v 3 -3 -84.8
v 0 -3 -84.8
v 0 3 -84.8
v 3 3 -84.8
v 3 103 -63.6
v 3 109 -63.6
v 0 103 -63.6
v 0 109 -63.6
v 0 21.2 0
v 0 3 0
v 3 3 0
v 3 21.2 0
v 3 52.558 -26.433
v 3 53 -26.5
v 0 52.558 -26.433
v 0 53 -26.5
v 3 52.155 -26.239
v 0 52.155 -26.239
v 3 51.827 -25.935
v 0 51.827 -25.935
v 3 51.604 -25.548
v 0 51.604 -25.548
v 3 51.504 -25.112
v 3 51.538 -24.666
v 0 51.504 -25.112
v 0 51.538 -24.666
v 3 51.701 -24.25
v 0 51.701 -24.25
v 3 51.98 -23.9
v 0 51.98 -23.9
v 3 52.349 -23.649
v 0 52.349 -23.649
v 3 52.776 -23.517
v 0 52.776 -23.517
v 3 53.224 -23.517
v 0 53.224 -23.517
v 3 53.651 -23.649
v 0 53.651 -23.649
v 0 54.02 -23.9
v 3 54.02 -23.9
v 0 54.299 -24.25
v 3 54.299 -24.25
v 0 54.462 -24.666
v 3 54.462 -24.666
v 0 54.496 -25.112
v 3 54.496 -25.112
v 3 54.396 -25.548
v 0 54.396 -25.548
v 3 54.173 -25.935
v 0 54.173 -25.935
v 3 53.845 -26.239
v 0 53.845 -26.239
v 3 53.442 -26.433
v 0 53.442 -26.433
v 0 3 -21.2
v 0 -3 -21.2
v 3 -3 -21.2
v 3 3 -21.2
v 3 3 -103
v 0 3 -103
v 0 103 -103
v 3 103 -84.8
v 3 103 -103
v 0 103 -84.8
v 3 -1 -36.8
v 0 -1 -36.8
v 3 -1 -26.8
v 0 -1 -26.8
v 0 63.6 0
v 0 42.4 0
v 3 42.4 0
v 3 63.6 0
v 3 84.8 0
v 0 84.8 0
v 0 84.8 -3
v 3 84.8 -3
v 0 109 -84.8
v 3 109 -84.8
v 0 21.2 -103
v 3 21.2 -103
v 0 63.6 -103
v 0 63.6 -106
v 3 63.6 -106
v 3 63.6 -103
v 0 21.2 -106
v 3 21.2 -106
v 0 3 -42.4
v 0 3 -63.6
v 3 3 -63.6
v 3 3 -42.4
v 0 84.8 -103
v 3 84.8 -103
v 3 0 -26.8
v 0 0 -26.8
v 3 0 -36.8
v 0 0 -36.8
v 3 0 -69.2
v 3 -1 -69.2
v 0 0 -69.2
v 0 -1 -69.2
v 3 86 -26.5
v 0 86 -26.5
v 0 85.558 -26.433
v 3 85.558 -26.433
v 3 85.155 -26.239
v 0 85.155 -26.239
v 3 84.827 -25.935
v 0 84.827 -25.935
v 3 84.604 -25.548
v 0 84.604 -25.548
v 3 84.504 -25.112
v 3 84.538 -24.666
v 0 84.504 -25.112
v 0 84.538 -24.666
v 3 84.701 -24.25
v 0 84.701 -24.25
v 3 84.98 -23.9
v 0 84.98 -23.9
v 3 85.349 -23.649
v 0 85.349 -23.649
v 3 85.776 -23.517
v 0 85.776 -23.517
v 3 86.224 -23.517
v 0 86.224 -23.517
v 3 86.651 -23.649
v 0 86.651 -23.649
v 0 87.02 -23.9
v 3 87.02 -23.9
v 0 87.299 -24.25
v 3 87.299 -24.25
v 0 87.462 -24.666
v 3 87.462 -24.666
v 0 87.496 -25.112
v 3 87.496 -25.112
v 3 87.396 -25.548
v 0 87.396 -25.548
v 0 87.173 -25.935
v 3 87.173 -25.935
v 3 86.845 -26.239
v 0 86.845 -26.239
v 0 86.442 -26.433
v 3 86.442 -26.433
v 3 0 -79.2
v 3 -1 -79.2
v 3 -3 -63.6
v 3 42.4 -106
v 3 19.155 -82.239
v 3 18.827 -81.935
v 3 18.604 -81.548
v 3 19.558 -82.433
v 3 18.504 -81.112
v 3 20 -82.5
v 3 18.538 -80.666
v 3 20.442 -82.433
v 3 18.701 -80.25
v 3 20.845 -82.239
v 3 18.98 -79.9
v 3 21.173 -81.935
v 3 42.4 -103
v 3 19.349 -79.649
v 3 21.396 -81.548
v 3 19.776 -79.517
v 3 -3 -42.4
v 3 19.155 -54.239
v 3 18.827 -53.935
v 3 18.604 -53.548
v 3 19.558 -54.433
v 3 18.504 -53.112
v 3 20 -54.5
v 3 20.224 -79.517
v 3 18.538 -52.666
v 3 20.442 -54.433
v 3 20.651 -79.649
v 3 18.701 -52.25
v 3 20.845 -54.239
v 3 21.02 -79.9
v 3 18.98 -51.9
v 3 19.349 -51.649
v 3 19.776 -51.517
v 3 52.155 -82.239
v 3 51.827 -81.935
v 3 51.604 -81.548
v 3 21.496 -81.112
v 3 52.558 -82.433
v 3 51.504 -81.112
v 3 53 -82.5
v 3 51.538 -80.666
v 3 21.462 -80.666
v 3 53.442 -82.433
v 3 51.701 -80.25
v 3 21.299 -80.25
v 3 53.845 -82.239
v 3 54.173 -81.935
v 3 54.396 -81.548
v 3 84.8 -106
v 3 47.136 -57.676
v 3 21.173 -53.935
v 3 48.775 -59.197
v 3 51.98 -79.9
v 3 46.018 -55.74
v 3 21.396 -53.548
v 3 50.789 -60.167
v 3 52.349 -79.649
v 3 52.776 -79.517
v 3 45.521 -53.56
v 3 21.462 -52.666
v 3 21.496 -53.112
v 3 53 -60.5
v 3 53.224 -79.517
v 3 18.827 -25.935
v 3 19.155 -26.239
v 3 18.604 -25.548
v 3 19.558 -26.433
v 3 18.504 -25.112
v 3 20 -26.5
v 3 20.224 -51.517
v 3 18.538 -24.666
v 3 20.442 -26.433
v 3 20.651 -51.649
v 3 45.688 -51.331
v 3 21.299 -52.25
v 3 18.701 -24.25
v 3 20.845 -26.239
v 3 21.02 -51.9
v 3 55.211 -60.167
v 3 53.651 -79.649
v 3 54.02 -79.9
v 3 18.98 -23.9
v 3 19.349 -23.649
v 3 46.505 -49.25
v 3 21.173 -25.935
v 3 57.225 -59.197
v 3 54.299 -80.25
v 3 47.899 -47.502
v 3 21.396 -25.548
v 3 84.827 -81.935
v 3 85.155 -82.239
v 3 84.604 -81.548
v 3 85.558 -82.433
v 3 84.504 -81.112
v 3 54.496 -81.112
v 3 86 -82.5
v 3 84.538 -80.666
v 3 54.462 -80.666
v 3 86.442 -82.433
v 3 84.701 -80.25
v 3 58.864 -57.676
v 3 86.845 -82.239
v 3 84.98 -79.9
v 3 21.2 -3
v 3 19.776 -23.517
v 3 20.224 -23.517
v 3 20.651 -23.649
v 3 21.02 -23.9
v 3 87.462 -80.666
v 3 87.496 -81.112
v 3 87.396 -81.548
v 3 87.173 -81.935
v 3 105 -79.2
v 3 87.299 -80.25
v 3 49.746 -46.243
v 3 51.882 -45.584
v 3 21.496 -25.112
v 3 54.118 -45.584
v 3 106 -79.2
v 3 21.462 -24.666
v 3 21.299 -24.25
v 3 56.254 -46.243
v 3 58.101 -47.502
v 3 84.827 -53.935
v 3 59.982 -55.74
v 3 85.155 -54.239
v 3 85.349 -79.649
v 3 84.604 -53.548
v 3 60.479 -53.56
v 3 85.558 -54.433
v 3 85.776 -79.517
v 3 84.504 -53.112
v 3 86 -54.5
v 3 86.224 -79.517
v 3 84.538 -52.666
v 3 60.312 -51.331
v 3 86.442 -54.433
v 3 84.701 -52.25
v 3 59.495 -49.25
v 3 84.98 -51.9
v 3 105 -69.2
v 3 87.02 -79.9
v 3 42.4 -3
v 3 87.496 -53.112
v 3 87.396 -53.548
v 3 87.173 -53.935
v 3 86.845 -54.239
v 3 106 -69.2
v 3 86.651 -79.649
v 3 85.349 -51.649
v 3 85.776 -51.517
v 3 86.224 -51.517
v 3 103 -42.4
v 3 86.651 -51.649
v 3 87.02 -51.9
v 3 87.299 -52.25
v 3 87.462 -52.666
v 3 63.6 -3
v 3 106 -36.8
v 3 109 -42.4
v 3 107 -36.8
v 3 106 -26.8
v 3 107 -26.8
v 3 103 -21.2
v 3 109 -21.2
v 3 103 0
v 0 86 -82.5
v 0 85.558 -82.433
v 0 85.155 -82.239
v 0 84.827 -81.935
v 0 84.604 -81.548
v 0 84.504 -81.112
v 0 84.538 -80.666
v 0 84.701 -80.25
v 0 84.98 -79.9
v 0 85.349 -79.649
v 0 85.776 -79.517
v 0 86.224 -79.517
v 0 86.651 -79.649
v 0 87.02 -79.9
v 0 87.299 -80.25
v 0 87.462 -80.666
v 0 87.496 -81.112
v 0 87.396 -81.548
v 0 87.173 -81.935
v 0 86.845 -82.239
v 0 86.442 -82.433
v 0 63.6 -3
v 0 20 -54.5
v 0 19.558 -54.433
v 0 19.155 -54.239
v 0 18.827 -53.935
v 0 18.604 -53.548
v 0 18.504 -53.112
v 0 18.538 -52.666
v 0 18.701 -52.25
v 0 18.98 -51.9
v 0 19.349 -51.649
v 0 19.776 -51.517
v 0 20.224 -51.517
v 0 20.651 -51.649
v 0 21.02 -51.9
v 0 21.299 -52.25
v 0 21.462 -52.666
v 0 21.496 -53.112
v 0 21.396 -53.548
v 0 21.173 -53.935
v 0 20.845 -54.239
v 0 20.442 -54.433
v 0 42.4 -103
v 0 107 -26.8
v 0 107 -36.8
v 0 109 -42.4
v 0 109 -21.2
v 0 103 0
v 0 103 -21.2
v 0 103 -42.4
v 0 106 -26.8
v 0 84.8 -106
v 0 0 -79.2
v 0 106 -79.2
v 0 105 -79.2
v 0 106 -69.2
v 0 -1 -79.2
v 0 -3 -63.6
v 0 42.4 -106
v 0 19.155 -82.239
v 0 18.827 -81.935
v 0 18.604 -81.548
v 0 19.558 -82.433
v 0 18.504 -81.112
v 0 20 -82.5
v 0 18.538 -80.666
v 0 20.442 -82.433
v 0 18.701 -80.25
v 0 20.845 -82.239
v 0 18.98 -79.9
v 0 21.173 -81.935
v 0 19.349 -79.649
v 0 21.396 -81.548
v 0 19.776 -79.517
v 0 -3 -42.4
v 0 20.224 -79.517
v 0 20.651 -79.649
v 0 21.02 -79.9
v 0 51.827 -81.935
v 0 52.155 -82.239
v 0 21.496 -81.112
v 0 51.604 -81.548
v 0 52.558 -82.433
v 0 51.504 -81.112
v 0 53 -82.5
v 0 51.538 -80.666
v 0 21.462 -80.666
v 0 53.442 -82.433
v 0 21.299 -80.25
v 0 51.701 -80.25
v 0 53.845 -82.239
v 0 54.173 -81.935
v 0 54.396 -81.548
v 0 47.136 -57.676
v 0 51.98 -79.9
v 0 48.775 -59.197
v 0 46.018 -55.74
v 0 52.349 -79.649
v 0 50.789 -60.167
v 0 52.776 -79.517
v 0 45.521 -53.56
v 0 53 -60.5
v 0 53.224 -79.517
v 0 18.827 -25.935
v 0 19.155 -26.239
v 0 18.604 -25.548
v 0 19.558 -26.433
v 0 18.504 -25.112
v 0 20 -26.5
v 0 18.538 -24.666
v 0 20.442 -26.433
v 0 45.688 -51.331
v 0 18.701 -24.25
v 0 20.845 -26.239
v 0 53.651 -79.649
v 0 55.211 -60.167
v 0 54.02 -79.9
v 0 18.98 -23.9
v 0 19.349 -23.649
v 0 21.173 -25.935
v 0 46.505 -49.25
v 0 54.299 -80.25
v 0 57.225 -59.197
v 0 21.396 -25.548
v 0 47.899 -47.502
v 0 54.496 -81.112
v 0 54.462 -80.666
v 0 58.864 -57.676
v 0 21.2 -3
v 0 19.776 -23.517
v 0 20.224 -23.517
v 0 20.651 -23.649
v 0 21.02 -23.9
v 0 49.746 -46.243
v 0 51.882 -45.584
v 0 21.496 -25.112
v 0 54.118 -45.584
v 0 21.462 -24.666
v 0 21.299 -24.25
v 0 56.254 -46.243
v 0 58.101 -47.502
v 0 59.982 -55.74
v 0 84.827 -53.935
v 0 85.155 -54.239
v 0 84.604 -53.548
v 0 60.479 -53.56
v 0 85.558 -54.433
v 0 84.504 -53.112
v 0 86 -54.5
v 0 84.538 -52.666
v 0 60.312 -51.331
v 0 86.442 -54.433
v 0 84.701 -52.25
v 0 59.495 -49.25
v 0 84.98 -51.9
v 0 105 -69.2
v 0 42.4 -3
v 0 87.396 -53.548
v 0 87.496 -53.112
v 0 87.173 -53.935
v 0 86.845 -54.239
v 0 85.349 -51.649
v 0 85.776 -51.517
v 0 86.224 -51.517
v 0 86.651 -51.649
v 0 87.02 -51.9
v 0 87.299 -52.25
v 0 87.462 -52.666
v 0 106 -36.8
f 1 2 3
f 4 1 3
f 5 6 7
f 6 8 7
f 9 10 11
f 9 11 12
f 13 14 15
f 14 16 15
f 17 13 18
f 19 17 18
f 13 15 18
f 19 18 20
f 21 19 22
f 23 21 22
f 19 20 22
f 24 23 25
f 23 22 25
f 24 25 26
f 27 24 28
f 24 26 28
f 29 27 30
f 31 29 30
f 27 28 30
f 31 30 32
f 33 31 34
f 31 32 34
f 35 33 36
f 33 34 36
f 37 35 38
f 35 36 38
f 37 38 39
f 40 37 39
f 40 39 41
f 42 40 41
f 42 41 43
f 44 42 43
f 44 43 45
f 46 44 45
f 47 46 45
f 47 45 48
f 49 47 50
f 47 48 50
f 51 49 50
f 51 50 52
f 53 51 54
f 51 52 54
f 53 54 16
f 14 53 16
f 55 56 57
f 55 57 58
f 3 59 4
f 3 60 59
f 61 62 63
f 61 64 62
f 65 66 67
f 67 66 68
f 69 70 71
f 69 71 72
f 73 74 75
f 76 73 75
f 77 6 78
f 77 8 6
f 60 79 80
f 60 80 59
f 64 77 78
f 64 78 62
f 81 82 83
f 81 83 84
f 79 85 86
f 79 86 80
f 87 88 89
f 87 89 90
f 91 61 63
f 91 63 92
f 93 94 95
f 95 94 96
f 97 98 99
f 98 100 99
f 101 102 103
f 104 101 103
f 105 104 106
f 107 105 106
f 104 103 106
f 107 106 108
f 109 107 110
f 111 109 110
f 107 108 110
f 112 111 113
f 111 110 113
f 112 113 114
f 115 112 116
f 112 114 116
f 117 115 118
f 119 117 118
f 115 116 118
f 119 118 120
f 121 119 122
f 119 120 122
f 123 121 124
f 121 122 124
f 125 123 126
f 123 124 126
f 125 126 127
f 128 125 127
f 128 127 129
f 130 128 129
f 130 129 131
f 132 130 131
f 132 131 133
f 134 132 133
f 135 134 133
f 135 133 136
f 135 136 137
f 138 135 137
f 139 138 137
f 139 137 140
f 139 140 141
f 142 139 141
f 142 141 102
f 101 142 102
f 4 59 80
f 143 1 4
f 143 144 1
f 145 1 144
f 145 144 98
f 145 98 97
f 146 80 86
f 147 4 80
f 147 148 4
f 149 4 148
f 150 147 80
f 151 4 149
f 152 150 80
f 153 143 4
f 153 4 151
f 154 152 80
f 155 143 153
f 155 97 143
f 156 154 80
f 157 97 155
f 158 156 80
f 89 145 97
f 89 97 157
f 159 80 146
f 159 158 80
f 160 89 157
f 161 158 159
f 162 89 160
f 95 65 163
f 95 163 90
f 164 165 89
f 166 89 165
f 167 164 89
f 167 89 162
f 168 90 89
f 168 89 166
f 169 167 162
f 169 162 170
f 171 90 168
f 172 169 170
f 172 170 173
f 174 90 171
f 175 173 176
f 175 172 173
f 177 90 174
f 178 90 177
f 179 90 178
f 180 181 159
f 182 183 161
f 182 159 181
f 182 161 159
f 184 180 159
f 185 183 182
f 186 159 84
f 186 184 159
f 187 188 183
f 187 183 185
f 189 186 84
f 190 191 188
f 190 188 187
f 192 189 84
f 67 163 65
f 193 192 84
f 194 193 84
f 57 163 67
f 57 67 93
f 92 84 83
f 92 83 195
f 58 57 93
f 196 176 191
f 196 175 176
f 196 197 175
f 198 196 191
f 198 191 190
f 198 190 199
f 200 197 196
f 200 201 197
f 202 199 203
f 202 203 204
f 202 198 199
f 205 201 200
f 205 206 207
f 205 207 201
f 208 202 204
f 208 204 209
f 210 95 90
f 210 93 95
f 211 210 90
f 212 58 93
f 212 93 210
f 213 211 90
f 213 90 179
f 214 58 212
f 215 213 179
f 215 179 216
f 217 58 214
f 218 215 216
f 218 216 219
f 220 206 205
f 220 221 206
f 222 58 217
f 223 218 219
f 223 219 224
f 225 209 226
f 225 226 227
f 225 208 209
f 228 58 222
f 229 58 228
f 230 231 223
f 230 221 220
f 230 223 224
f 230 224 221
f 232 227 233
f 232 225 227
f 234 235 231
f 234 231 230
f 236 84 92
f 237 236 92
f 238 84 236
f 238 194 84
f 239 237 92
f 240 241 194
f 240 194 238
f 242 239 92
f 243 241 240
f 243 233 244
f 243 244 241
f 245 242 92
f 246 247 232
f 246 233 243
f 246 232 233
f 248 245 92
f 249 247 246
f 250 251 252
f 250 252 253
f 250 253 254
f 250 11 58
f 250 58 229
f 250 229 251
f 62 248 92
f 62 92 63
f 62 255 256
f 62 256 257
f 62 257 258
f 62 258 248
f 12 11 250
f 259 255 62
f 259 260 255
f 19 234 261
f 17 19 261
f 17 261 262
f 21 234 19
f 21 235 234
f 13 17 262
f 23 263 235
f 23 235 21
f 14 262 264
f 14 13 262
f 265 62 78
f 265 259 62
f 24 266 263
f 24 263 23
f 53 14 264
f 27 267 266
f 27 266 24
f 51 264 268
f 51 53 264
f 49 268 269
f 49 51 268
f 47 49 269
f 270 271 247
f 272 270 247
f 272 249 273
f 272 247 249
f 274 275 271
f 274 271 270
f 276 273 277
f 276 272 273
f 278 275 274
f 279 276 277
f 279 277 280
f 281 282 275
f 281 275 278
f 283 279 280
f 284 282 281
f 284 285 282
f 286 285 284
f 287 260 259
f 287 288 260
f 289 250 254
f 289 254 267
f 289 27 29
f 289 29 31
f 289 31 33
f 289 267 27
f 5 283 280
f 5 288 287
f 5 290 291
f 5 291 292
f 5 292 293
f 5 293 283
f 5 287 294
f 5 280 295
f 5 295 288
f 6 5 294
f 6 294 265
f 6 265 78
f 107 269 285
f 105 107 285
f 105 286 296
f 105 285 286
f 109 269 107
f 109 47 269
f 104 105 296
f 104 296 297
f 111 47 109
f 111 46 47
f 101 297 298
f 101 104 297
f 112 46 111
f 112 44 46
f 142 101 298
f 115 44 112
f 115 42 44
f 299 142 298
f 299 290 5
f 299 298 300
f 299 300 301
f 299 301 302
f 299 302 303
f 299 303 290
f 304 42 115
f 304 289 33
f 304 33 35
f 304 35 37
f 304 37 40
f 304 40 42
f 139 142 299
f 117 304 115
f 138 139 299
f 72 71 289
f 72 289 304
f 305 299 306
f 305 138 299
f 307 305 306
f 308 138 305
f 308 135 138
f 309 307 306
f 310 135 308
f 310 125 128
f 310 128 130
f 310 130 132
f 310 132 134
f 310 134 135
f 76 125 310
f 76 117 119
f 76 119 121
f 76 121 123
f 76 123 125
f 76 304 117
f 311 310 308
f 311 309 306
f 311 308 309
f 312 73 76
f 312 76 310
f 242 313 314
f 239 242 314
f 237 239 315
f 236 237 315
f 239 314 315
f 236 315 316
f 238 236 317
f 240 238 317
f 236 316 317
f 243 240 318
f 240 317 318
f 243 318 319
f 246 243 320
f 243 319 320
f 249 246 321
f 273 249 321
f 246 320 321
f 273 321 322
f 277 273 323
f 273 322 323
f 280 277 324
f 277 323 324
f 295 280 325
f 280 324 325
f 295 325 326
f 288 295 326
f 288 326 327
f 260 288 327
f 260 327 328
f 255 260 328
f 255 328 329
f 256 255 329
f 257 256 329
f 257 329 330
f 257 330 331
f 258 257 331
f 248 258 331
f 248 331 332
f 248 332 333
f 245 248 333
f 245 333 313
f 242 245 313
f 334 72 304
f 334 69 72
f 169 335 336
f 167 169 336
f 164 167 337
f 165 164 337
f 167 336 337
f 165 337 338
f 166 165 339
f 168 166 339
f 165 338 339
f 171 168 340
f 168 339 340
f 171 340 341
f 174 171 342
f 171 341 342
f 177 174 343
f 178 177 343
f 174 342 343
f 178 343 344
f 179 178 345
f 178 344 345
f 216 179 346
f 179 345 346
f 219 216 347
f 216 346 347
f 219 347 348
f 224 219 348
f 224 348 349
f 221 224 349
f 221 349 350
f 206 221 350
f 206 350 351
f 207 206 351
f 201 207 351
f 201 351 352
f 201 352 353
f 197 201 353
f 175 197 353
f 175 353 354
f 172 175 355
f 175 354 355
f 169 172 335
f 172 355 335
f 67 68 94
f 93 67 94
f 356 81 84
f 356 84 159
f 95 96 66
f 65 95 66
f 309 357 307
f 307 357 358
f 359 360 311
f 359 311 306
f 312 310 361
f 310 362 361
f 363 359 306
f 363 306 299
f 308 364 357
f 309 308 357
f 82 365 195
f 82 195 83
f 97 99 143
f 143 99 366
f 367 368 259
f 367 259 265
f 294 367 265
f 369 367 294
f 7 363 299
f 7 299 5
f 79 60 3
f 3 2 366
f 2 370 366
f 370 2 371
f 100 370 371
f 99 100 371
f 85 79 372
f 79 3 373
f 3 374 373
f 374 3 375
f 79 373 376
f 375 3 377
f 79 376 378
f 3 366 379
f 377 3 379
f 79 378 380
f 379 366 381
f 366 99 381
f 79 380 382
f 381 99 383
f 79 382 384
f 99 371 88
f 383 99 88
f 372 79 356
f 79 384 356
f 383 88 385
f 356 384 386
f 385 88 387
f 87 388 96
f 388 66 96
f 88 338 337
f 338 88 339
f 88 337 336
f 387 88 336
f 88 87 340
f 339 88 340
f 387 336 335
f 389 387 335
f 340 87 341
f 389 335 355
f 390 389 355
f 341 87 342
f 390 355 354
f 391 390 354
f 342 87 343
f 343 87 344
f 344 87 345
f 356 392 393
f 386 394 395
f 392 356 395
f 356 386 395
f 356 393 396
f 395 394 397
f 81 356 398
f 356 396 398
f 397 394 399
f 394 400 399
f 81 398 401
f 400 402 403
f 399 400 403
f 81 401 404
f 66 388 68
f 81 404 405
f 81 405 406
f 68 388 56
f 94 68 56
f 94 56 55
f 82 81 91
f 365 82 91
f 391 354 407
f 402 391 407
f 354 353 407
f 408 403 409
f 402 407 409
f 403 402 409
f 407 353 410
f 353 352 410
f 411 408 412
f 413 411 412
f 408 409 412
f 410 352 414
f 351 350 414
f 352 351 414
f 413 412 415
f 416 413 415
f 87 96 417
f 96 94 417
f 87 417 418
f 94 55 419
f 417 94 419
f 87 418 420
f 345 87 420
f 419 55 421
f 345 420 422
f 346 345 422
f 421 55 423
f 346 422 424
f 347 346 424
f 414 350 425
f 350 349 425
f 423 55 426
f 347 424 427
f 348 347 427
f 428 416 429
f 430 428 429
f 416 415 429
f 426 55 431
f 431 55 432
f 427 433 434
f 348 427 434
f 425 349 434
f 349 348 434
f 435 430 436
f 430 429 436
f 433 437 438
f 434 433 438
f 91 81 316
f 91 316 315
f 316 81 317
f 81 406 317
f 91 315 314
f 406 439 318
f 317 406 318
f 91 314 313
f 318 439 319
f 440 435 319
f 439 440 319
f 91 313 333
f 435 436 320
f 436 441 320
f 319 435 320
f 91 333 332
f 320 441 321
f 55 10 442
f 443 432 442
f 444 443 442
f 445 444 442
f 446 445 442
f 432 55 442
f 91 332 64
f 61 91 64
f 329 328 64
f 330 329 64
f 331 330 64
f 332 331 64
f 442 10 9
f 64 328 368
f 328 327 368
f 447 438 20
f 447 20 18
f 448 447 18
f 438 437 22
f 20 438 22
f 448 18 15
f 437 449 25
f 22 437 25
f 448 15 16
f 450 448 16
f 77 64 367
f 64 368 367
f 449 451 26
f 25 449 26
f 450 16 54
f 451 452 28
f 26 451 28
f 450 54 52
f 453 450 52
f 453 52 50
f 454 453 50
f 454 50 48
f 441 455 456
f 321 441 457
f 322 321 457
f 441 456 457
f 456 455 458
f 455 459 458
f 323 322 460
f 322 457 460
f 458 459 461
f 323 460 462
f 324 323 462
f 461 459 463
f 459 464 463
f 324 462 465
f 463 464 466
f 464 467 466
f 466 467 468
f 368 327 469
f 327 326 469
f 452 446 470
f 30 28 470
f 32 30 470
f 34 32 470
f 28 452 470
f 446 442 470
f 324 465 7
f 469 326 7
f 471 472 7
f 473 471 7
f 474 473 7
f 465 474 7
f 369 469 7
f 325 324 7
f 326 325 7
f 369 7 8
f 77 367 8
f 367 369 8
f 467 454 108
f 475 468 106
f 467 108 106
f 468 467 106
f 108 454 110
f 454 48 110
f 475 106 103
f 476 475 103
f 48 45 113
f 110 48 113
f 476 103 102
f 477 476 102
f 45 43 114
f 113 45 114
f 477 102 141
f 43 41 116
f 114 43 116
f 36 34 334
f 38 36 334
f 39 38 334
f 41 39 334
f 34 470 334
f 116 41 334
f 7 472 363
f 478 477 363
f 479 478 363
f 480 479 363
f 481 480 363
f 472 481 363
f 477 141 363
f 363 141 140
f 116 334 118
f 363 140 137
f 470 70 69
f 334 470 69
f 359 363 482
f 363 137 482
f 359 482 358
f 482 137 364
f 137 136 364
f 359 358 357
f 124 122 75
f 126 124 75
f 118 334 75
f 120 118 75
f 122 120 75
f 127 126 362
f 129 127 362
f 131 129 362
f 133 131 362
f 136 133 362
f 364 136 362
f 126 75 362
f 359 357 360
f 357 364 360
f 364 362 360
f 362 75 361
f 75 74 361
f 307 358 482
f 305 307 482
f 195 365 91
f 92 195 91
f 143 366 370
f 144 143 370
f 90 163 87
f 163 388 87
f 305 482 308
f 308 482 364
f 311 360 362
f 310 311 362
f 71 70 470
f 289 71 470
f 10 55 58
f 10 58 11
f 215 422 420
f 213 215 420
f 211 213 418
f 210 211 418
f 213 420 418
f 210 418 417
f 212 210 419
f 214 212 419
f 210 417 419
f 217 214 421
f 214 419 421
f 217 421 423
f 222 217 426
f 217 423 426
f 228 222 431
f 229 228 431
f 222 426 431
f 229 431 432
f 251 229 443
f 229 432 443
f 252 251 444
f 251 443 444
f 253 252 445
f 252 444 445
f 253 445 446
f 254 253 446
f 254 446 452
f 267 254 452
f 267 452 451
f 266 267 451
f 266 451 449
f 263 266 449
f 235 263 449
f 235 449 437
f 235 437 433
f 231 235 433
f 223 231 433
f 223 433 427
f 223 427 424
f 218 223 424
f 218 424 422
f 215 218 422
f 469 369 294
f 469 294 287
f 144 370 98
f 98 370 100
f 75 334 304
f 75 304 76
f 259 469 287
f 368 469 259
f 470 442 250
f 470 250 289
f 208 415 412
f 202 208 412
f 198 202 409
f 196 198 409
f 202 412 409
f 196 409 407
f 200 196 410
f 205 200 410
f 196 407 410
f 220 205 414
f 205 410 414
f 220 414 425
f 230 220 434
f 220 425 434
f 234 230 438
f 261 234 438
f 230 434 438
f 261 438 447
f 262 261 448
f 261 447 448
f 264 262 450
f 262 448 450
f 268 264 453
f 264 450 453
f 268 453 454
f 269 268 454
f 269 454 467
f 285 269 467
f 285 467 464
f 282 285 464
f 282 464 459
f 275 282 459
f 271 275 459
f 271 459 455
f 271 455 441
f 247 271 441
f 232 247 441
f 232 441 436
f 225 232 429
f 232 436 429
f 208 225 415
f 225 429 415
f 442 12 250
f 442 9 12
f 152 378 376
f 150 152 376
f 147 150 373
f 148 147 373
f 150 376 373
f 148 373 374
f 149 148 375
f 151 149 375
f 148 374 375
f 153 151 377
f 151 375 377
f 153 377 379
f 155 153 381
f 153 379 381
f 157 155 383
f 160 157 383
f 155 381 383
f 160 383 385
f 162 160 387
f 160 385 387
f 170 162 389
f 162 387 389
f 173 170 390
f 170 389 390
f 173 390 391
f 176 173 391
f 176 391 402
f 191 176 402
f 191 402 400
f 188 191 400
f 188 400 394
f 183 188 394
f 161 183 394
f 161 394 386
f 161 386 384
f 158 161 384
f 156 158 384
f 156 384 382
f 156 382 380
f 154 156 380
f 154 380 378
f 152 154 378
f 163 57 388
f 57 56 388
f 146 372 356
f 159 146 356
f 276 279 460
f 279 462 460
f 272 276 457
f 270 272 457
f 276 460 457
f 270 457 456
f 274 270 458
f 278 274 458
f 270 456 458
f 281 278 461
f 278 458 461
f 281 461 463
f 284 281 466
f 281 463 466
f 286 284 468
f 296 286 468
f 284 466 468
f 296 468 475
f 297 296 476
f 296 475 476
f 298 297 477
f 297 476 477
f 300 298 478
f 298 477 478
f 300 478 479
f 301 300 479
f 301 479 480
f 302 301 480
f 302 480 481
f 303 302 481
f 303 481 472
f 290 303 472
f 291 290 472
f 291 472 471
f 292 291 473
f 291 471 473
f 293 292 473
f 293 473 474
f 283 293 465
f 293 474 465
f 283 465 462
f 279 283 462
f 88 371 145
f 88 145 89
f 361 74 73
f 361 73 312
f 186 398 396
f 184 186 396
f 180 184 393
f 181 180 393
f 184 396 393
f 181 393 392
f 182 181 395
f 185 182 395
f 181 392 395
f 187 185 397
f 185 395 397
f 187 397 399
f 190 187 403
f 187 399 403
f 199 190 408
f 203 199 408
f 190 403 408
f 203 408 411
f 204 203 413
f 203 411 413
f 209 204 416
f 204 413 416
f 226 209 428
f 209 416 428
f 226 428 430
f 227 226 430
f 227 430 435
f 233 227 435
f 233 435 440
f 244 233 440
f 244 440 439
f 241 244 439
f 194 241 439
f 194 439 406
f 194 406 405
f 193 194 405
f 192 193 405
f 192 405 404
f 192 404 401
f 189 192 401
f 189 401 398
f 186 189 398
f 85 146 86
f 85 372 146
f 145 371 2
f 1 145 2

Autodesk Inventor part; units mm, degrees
ref_plane "YZ Plane" through (0, 0, 0) normal (1, 0, 0) x (0, 1, 0)
ref_plane "XZ Plane" through (0, 0, 0) normal (0, 1, 0) x (-1, 0, 0)
ref_plane "XY Plane" through (0, 0, 0) normal (0, 0, 1) x (1, 0, 0)
sketch "Sketch1" plane through (0, 0, 0) normal (1, 0, 0) x (0, 1, 0)
  line L0 (21.2, 0) -> (21.2, -3)
  line L1 (42.4, 0) -> (42.4, -3)
  line L2 (63.6, 0) -> (63.6, -3)
  line L3 (84.8, 0) -> (84.8, -3)
  line L4 (-3, -21.2) -> (3, -21.2)
  line L5 (-3, -42.4) -> (3, -42.4)
  line L6 (-3, -63.6) -> (3, -63.6)
  line L7 (-3, -84.8) -> (3, -84.8)
  line L8 (21.2, -106) -> (21.2, -103)
  line L9 (42.4, -106) -> (42.4, -103)
  line L10 (63.6, -106) -> (63.6, -103)
  line L11 (84.8, -106) -> (84.8, -103)
  line L12 (109, -84.8) -> (103, -84.8)
  line L13 (109, -63.6) -> (103, -63.6)
  line L14 (109, -42.4) -> (103, -42.4)
  line L15 (109, -21.2) -> (103, -21.2)
  line L16 (3, -103) -> (3, -84.8)
  line L17 (3, -63.6) -> (3, -42.4)
  line L18 (3, -21.2) -> (3, -3)
  line L19 (103, -3) -> (103, -21.2)
  line L20 (103, -42.4) -> (103, -63.6)
  line L21 (103, -84.8) -> (103, -103)
  line L22 (21.2, -103) -> (3, -103)
  line L23 (84.8, -106) -> (63.6, -106)
  line L24 (42.4, -106) -> (21.2, -106)
  line L25 (103, -103) -> (84.8, -103)
  line L26 (63.6, -103) -> (42.4, -103)
  line L27 (103, -3) -> (103, 0)
  line L28 (3, -3) -> (3, 0)
  line L29 (3, 0) -> (21.2, 0)
  line L30 (21.2, -3) -> (42.4, -3)
  line L31 (63.6, -3) -> (84.8, -3)
  line L32 (42.4, 0) -> (63.6, 0)
  line L33 (84.8, 0) -> (103, 0)
  line L34 (-3, -63.6) -> (-3, -84.8)
  line L35 (-3, -21.2) -> (-3, -42.4)
  line L36 (109, -21.2) -> (109, -42.4)
  line L37 (109, -63.6) -> (109, -84.8)
  line L38 (-1, -26.8) -> (0, -26.8)
  line L39 (0, -26.8) -> (0, -36.8)
  line L40 (0, -36.8) -> (-1, -36.8)
  line L41 (-1, -36.8) -> (-1, -26.8)
  line L42 (0, -79.2) -> (-1, -79.2)
  line L43 (-1, -79.2) -> (-1, -69.2)
  line L44 (-1, -69.2) -> (0, -69.2)
  line L45 (0, -69.2) -> (0, -79.2)
  line L46 (106, -26.8) -> (107, -26.8)
  line L47 (107, -26.8) -> (107, -36.8)
  line L48 (107, -36.8) -> (106, -36.8)
  line L49 (106, -36.8) -> (106, -26.8)
  line L50 (106, -69.2) -> (105, -69.2)
  line L51 (105, -69.2) -> (105, -79.2)
  line L52 (105, -79.2) -> (106, -79.2)
  line L53 (106, -79.2) -> (106, -69.2)
  point P0 (0, 0)
  dimension "d109" = 10
  dimension "d110" = 10
  dimension "d111" = 1
  dimension "d112" = 10
  dimension "d113" = 1
  dimension "d114" = 10
extrude "Extrusion1" add sketch "Sketch1" along normal blind 3
sketch "Sketch3" plane through (3, 0, 0) normal (1, 0, 0) x (0, 0, -1)
  circle A0 centre (53, 53) radius 5
  point P0 (0, 0)
  dimension "d6" = 10
hole "Hole1" at (3, 53, -53) direction (-1, 0, 0) diameter 15 end through all
sketch "Sketch5" plane through (3, 0, 0) normal (1, 0, 0) x (0, 0, -1)
  circle A0 centre (25, 20) radius 1.5
  point P0 (0, 0)
  dimension "d45" = 3
hole "Hole4" at (3, 20, -25) direction (-1, 0, 0) diameter 3 end through all
sketch "Sketch6" plane through (3, 0, 0) normal (1, 0, 0) x (0, 0, -1)
  circle A0 centre (53, 20) radius 1.5
  point P0 (0, 0)
  dimension "d53" = 3
sketch "Sketch7" plane through (3, 0, 0) normal (1, 0, 0) x (0, 0, -1)
  point P0 (0, 0)
hole "Hole5" at (3, 20, -53) direction (-1, 0, 0) diameter 3 end through all
sketch "Sketch8" plane through (3, 0, 0) normal (1, 0, 0) x (0, 0, -1)
  circle A0 centre (81, 20) radius 1.5
  point P0 (0, 0)
  dimension "d61" = 3
hole "Hole6" at (3, 20, -81) direction (-1, 0, 0) diameter 3 end through all
sketch "Sketch9" plane through (3, 0, 0) normal (1, 0, 0) x (0, 0, -1)
  circle A0 centre (25, 53) radius 1.5
  point P0 (0, 0)
  dimension "d69" = 3
hole "Hole7" at (3, 53, -25) direction (-1, 0, 0) diameter 3 end through all
sketch "Sketch10" plane through (3, 0, 0) normal (1, 0, 0) x (0, 0, -1)
  circle A0 centre (81, 53) radius 1.5
  point P0 (0, 0)
  dimension "d77" = 3
hole "Hole8" at (3, 53, -81) direction (-1, 0, 0) diameter 3 end through all
sketch "Sketch11" plane through (3, 0, 0) normal (1, 0, 0) x (0, 0, -1)
  circle A0 centre (25, 86) radius 1.5
  point P0 (0, 0)
  dimension "d85" = 3
hole "Hole9" at (3, 86, -25) direction (-1, 0, 0) diameter 3 end through all
sketch "Sketch12" plane through (3, 0, 0) normal (1, 0, 0) x (0, 0, -1)
  circle A0 centre (53, 86) radius 1.5
  point P0 (0, 0)
  dimension "d93" = 3
hole "Hole10" at (3, 86, -53) direction (-1, 0, 0) diameter 3 end through all
sketch "Sketch13" plane through (3, 0, 0) normal (1, 0, 0) x (0, 0, -1)
  circle A0 centre (81, 86) radius 1.5
  point P0 (0, 0)
  dimension "d101" = 3
hole "Hole11" at (3, 86, -81) direction (-1, 0, 0) diameter 3 end through all
properties part number "Box side 1" material "PMMA Plastic"
